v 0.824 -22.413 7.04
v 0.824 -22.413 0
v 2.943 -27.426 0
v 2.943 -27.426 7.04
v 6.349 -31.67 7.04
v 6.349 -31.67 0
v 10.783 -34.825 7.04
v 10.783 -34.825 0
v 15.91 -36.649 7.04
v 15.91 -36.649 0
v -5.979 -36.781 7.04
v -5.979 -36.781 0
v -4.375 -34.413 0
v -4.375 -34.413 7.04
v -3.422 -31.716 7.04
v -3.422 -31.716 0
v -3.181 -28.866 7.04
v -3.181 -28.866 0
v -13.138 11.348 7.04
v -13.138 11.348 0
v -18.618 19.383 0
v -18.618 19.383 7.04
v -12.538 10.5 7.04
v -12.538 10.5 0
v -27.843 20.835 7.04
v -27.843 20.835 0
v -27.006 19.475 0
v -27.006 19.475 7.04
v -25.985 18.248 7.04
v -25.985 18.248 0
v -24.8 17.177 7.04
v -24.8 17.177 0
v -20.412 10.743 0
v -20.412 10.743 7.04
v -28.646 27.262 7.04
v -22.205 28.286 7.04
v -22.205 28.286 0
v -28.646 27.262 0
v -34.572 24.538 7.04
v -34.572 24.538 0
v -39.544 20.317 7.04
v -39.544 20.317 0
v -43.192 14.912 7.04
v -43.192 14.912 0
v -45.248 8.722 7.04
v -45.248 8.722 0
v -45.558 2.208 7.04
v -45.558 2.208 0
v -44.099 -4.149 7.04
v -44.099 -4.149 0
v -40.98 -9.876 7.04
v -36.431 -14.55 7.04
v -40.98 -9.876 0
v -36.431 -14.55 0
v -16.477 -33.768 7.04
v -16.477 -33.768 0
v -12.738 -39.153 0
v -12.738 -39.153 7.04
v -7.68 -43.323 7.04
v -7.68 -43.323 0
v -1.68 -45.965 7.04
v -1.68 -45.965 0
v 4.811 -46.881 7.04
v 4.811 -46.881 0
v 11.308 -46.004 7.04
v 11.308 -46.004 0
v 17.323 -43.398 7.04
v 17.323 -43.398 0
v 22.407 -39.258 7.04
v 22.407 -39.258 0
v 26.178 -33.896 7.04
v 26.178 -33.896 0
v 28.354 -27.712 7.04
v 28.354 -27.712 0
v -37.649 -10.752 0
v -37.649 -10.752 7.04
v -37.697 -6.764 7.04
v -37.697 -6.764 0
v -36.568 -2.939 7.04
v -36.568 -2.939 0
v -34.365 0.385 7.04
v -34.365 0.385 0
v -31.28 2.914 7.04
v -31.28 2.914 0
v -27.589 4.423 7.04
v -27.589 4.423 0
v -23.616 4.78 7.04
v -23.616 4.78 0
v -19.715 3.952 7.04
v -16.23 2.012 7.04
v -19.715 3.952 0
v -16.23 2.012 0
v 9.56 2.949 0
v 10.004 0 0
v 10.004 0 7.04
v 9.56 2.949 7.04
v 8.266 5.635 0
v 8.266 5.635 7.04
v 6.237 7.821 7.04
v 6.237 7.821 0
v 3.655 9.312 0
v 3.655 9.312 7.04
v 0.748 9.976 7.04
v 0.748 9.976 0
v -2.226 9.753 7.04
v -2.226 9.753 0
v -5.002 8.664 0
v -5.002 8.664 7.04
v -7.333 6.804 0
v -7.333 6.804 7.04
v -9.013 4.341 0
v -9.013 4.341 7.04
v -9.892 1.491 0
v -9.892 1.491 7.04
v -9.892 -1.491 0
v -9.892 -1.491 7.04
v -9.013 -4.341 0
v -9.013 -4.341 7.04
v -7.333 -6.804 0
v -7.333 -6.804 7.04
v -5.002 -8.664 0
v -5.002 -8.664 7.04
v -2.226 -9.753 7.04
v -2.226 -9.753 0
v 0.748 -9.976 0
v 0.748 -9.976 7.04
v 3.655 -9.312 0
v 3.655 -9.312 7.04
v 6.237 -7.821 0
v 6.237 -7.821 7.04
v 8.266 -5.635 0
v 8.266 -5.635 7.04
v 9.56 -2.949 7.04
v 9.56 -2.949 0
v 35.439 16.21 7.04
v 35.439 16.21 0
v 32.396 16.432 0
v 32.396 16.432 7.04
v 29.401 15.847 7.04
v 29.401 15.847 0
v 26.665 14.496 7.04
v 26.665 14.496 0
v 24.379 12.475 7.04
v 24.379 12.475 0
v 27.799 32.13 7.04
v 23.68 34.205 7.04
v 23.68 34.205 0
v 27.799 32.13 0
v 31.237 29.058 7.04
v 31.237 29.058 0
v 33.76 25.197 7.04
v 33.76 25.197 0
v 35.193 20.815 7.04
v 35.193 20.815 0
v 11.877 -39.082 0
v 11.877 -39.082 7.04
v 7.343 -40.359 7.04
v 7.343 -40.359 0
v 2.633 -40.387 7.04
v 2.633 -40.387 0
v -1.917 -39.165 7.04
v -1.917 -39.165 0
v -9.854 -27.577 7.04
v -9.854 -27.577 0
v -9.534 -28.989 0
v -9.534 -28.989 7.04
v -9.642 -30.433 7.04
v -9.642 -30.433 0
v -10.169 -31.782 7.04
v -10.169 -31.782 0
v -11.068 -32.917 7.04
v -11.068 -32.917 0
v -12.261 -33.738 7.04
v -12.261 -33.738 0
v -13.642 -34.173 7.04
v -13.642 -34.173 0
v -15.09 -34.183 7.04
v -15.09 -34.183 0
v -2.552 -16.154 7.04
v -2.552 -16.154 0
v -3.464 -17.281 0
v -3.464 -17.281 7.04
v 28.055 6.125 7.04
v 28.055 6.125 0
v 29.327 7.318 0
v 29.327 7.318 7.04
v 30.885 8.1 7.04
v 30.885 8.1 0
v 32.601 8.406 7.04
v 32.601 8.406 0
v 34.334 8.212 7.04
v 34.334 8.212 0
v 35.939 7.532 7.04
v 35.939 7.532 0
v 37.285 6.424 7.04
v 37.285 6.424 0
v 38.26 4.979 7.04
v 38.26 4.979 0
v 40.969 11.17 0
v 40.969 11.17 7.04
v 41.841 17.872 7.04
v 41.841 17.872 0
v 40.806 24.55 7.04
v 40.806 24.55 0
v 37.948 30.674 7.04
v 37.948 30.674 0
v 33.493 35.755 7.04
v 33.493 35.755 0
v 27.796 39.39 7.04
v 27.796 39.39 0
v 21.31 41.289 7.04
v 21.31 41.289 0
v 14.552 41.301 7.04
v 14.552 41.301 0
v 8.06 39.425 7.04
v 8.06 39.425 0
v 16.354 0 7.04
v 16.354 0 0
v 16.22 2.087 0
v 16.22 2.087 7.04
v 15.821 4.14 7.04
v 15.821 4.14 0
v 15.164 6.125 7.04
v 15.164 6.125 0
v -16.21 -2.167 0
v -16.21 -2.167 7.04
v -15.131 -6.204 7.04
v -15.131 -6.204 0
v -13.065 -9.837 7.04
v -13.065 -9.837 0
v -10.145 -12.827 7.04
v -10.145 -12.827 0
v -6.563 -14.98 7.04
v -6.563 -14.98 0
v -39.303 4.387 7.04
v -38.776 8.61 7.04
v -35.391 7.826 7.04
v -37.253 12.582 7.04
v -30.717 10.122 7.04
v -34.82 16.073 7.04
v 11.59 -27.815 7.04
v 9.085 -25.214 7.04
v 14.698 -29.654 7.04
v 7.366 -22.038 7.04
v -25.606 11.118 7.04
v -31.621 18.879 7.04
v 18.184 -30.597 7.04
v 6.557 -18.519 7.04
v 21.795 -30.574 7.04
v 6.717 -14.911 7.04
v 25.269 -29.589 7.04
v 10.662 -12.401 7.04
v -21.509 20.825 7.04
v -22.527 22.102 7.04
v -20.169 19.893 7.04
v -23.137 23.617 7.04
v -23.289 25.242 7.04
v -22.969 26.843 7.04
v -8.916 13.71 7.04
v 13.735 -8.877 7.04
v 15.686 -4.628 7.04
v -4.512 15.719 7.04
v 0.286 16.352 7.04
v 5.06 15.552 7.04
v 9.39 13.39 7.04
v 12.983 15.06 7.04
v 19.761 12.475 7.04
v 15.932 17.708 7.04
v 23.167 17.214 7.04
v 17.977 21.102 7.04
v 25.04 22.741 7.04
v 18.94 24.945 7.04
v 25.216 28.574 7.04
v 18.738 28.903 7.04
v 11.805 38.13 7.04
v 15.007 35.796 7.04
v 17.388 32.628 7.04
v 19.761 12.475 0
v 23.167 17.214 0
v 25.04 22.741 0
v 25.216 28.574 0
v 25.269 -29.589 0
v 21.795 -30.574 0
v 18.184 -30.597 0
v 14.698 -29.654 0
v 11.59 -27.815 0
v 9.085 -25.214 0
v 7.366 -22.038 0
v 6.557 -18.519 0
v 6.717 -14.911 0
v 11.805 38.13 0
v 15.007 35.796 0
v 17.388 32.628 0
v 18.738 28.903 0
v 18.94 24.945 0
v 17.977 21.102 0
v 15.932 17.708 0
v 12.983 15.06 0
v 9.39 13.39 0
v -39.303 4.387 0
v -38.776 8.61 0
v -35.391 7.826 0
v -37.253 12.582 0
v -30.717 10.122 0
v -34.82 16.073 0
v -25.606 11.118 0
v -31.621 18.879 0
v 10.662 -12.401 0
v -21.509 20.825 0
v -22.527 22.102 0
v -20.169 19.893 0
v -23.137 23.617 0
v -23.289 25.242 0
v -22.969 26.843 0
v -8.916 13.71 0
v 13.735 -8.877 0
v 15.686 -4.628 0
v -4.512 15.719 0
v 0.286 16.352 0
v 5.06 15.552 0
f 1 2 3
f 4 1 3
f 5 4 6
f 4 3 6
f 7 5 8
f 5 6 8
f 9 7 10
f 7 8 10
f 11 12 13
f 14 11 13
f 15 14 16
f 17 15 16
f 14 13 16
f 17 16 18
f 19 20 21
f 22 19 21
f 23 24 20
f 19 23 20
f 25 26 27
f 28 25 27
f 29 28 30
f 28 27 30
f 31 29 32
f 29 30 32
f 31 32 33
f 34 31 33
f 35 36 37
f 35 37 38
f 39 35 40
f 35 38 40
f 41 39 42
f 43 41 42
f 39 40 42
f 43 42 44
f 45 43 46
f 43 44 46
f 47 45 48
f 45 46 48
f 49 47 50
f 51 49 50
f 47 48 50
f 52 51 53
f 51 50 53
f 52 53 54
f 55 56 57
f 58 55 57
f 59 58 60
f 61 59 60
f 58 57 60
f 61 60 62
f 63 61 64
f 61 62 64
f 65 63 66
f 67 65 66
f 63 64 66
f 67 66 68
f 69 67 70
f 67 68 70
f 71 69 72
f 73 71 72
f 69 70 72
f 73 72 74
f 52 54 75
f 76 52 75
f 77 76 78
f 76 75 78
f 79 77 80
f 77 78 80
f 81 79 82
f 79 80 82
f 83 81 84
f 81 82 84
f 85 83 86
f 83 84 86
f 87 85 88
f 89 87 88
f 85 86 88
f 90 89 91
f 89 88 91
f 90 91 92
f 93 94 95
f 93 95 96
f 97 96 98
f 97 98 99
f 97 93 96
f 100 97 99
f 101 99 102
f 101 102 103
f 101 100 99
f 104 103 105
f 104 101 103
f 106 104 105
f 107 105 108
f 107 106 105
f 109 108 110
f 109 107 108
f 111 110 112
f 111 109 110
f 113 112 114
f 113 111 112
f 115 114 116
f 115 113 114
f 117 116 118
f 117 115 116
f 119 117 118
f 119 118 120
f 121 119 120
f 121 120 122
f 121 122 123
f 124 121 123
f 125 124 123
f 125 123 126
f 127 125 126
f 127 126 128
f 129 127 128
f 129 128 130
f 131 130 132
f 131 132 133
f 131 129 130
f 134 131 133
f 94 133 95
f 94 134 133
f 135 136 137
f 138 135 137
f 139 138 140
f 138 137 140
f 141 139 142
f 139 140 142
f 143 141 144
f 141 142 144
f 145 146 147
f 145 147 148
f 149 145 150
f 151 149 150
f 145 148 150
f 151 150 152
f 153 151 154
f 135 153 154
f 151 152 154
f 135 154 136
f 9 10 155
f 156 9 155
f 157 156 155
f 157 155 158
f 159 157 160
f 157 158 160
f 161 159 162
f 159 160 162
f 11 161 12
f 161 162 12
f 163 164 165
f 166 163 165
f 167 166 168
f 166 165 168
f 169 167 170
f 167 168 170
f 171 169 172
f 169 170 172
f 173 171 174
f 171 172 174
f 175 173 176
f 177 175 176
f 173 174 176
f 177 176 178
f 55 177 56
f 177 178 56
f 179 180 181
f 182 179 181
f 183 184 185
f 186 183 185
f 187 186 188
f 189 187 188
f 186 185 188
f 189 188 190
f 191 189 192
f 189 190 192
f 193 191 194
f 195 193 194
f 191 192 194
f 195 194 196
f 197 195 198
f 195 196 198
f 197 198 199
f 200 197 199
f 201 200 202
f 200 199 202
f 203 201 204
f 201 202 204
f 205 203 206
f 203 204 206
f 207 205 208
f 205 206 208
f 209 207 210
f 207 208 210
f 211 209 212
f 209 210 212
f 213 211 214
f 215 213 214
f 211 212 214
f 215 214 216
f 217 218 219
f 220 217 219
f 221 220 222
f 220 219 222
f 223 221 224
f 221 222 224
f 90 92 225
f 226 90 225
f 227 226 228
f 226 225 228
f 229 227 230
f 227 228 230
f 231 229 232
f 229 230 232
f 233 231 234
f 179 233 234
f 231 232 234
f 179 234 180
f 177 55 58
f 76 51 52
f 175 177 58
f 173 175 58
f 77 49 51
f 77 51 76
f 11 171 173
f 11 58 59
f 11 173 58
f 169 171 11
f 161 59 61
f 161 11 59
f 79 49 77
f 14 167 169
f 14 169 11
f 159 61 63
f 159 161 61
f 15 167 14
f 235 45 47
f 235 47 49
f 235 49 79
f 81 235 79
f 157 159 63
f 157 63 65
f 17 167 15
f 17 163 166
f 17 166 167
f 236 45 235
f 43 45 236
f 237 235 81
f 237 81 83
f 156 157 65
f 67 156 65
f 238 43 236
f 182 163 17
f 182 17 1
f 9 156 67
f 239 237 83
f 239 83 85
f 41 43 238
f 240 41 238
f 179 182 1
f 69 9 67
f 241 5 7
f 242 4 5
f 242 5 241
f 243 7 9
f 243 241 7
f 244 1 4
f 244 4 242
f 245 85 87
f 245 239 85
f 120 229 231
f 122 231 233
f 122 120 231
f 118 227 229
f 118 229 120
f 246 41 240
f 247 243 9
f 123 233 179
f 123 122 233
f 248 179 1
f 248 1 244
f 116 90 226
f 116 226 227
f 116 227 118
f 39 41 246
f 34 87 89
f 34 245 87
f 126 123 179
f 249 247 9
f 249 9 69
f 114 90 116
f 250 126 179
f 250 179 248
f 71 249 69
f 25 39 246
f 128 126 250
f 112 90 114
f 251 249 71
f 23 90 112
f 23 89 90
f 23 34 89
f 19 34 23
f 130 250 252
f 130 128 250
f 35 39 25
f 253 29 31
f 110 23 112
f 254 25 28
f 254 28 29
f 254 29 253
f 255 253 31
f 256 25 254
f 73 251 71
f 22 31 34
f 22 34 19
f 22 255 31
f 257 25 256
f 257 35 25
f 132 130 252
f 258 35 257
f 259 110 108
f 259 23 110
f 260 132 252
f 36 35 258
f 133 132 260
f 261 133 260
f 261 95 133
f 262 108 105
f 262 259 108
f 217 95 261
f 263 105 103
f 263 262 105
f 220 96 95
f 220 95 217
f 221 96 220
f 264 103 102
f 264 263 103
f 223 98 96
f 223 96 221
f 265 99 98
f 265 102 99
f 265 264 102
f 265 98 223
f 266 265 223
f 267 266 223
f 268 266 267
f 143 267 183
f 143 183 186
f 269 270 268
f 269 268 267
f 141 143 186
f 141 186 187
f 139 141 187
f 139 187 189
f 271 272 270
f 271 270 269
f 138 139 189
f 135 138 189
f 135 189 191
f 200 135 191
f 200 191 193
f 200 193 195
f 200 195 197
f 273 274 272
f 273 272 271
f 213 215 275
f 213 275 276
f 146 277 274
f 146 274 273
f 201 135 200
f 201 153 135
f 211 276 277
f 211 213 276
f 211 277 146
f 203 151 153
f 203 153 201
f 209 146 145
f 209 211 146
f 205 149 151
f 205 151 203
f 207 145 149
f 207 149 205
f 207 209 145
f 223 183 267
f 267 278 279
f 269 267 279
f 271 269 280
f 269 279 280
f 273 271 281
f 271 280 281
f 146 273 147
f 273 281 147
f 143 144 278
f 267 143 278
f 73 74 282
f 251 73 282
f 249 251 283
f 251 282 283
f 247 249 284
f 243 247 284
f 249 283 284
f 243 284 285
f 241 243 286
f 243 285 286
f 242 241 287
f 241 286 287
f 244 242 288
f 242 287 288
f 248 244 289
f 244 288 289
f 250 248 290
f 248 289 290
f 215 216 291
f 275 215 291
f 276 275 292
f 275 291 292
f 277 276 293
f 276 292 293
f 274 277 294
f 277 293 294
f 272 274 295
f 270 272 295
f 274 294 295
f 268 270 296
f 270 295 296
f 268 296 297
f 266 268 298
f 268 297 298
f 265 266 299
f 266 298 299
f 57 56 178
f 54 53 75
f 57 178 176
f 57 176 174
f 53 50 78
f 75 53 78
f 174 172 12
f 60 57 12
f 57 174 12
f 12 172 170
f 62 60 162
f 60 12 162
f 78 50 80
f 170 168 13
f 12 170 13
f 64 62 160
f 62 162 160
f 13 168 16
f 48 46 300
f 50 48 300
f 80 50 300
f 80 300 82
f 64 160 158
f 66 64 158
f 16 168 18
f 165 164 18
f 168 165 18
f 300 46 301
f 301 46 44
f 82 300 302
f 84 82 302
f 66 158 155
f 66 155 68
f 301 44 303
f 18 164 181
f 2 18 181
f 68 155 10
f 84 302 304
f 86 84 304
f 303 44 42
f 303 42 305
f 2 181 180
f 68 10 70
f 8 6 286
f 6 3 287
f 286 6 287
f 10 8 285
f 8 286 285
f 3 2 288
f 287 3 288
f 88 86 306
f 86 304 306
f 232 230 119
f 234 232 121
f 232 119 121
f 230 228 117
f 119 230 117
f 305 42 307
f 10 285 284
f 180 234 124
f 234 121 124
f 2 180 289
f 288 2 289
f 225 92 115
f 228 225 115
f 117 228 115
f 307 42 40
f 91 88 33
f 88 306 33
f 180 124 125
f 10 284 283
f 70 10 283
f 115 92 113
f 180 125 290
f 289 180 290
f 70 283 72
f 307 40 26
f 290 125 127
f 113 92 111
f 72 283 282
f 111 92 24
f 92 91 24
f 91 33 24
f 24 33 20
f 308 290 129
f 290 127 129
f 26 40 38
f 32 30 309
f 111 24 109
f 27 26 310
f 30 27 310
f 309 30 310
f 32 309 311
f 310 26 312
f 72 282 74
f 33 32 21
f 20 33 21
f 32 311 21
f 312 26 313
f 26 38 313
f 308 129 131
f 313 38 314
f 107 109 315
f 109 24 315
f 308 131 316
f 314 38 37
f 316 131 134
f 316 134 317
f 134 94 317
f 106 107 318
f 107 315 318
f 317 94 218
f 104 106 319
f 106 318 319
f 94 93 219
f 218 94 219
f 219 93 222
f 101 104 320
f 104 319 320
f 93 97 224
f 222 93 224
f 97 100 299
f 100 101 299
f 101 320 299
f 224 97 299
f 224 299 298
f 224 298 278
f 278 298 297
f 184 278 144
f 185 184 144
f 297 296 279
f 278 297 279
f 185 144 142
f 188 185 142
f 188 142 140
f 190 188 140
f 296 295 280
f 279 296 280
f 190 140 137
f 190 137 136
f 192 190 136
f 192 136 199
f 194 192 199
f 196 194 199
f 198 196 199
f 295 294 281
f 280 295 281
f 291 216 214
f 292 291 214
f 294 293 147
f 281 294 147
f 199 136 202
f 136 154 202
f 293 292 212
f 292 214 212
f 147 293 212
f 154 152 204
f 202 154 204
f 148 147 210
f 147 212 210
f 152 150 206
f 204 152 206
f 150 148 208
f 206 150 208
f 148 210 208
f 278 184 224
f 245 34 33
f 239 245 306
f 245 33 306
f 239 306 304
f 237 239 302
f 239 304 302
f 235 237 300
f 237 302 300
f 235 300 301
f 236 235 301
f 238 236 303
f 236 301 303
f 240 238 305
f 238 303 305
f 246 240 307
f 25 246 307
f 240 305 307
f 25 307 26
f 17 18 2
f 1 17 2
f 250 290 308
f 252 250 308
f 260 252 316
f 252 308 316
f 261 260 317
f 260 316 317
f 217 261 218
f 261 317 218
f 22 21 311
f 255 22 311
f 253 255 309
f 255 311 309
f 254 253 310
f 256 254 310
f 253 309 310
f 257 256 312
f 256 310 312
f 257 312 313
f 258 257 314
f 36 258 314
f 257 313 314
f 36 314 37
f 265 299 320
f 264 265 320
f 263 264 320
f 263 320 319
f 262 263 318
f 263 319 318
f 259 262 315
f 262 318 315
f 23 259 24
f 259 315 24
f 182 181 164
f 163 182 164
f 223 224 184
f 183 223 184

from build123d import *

# Parameters (mm, degrees)
F0_R     = 10.0040416518
F1_DEPTH = 7.04


with BuildPart() as f1:
    # F0 (on Top) → F1 (new body)
    with BuildSketch(Plane.XY):
        with BuildLine():
            ThreePointArc((8.0596013479, 39.4250795937), (18.9862113581, 26.931715548), (9.3900539463, 13.3896066124))
            ThreePointArc((9.3900539463, 13.3896066124), (12.8029919773, 10.175366076), (15.1637771231, 6.1249115676))
            Line((15.1637771231, 6.1249115676), (15.937639911, 6.1249115676))
            Line((15.937639911, 6.1249115676), (28.0554961826, 6.1249115676))
            ThreePointArc((28.0554961826, 6.1249115676), (33.4743323204, 8.3717454292), (38.2599624573, 4.9791370399))
            ThreePointArc((38.2599624573, 4.9791370399), (35.9003199694, 33.3723310432), (8.0596013479, 39.4250795937))
        make_face()
        with BuildLine():
            ThreePointArc((35.4391843293, 16.2098441298), (29.4013015143, 15.8466192988), (24.3793946911, 12.4749115676))
            Line((24.3793946911, 12.4749115676), (19.7612497114, 12.4749115676))
            ThreePointArc((19.7612497114, 12.4749115676), (25.0400123396, 22.7411647393), (23.6803165677, 34.204694583))
            ThreePointArc((23.6803165677, 34.204694583), (32.6253176497, 27.2104868561), (35.4391843293, 16.2098441298))
        make_face(mode=Mode.SUBTRACT)
        with BuildLine():
            ThreePointArc((15.1637771231, 6.1249115676), (12.8029919773, 10.175366076), (9.3900539463, 13.3896066124))
            ThreePointArc((9.3900539463, 13.3896066124), (-2.1364828918, 16.2138866162), (-12.5379799884, 10.5001779109))
            ThreePointArc((-12.5379799884, 10.5001779109), (-14.9968569617, 6.5229563558), (-16.2297438327, 2.0124844036))
            ThreePointArc((-16.2297438327, 2.0124844036), (-13.0647635418, -9.8370031995), (-2.5516255591, -16.1537576234))
            ThreePointArc((-2.5516255591, -16.1537576234), (-2.5484818112, -16.154253892), (-2.5453379668, -16.1547495488))
            ThreePointArc((-2.5453379668, -16.1547495488), (-2.5451208542, -16.1547837555), (-2.5449037412, -16.1548179593))
            ThreePointArc((-2.5449037412, -16.1548179593), (2.1768059123, -16.2085222759), (6.717037457, -14.9109384732))
            ThreePointArc((6.717037457, -14.9109384732), (13.7350898923, -8.877048158), (16.3540416518, 0))
            ThreePointArc((16.3540416518, 0), (16.0537179653, 3.1197464384), (15.1637771231, 6.1249115676))
        make_face()
        Circle(F0_R, mode=Mode.SUBTRACT)
        with BuildLine():
            ThreePointArc((-16.2297438327, 2.0124844036), (-14.9968569617, 6.5229563558), (-12.5379799884, 10.5001779109))
            Line((-12.5379799884, 10.5001779109), (-13.1381993498, 11.348302759))
            Line((-13.1381993498, 11.348302759), (-18.6180223097, 19.38283416))
            ThreePointArc((-18.6180223097, 19.38283416), (-22.886896, 22.8371620642), (-22.2051291736, 28.2860938723))
            ThreePointArc((-22.2051291736, 28.2860938723), (-44.431743107, 11.8873369712), (-36.4311702867, -14.5499932531))
            ThreePointArc((-36.4311702867, -14.5499932531), (-32.9169731903, 1.7648878816), (-16.2297438327, 2.0124844036))
        make_face()
        with BuildLine():
            ThreePointArc((-27.8425738277, 20.8345445104), (-26.5172228087, 18.8430269716), (-24.8001450054, 17.1773915828))
            Line((-24.8001450054, 17.1773915828), (-20.4118380564, 10.7432439401))
            ThreePointArc((-20.4118380564, 10.7432439401), (-30.7174803102, 10.1222622456), (-39.3025332707, 4.3873911753))
            ThreePointArc((-39.3025332707, 4.3873911753), (-36.142247382, 14.4014653535), (-27.8425738277, 20.8345445104))
        make_face(mode=Mode.SUBTRACT)
        with BuildLine():
            ThreePointArc((28.3540401584, -27.7120920045), (13.0814706801, -28.8399527249), (6.717037457, -14.9109384732))
            ThreePointArc((6.717037457, -14.9109384732), (2.1768059123, -16.2085222759), (-2.5449037412, -16.1548179593))
            ThreePointArc((-2.5449037412, -16.1548179593), (-2.5451208542, -16.1547837555), (-2.5453379668, -16.1547495488))
            ThreePointArc((-2.5453379668, -16.1547495488), (-2.5484818112, -16.154253892), (-2.5516255591, -16.1537576234))
            Line((-2.5516255591, -16.1537576234), (-3.4641944059, -17.2808545138))
            Line((-3.4641944059, -17.2808545138), (-9.8543521959, -27.576888898))
            ThreePointArc((-9.8543521959, -27.576888898), (-11.0679351896, -32.9167573694), (-16.4773315191, -33.7684676051))
            ThreePointArc((-16.4773315191, -33.7684676051), (8.0897637018, -46.6657507467), (28.3540401584, -27.7120920045))
        make_face()
        with BuildLine():
            ThreePointArc((-5.9789437938, -36.7808810105), (-3.8125370617, -33.0947145568), (-3.1808303734, -28.8659927744))
            Line((-3.1808303734, -28.8659927744), (0.8243466838, -22.4127185282))
            ThreePointArc((0.8243466838, -22.4127185282), (6.3485406517, -31.6703504661), (15.9104272307, -36.6493858287))
            ThreePointArc((15.9104272307, -36.6493858287), (4.9886650126, -40.5310640467), (-5.9789437938, -36.7808810105))
        make_face(mode=Mode.SUBTRACT)
    extrude(amount=F1_DEPTH)


solid = f1.part
